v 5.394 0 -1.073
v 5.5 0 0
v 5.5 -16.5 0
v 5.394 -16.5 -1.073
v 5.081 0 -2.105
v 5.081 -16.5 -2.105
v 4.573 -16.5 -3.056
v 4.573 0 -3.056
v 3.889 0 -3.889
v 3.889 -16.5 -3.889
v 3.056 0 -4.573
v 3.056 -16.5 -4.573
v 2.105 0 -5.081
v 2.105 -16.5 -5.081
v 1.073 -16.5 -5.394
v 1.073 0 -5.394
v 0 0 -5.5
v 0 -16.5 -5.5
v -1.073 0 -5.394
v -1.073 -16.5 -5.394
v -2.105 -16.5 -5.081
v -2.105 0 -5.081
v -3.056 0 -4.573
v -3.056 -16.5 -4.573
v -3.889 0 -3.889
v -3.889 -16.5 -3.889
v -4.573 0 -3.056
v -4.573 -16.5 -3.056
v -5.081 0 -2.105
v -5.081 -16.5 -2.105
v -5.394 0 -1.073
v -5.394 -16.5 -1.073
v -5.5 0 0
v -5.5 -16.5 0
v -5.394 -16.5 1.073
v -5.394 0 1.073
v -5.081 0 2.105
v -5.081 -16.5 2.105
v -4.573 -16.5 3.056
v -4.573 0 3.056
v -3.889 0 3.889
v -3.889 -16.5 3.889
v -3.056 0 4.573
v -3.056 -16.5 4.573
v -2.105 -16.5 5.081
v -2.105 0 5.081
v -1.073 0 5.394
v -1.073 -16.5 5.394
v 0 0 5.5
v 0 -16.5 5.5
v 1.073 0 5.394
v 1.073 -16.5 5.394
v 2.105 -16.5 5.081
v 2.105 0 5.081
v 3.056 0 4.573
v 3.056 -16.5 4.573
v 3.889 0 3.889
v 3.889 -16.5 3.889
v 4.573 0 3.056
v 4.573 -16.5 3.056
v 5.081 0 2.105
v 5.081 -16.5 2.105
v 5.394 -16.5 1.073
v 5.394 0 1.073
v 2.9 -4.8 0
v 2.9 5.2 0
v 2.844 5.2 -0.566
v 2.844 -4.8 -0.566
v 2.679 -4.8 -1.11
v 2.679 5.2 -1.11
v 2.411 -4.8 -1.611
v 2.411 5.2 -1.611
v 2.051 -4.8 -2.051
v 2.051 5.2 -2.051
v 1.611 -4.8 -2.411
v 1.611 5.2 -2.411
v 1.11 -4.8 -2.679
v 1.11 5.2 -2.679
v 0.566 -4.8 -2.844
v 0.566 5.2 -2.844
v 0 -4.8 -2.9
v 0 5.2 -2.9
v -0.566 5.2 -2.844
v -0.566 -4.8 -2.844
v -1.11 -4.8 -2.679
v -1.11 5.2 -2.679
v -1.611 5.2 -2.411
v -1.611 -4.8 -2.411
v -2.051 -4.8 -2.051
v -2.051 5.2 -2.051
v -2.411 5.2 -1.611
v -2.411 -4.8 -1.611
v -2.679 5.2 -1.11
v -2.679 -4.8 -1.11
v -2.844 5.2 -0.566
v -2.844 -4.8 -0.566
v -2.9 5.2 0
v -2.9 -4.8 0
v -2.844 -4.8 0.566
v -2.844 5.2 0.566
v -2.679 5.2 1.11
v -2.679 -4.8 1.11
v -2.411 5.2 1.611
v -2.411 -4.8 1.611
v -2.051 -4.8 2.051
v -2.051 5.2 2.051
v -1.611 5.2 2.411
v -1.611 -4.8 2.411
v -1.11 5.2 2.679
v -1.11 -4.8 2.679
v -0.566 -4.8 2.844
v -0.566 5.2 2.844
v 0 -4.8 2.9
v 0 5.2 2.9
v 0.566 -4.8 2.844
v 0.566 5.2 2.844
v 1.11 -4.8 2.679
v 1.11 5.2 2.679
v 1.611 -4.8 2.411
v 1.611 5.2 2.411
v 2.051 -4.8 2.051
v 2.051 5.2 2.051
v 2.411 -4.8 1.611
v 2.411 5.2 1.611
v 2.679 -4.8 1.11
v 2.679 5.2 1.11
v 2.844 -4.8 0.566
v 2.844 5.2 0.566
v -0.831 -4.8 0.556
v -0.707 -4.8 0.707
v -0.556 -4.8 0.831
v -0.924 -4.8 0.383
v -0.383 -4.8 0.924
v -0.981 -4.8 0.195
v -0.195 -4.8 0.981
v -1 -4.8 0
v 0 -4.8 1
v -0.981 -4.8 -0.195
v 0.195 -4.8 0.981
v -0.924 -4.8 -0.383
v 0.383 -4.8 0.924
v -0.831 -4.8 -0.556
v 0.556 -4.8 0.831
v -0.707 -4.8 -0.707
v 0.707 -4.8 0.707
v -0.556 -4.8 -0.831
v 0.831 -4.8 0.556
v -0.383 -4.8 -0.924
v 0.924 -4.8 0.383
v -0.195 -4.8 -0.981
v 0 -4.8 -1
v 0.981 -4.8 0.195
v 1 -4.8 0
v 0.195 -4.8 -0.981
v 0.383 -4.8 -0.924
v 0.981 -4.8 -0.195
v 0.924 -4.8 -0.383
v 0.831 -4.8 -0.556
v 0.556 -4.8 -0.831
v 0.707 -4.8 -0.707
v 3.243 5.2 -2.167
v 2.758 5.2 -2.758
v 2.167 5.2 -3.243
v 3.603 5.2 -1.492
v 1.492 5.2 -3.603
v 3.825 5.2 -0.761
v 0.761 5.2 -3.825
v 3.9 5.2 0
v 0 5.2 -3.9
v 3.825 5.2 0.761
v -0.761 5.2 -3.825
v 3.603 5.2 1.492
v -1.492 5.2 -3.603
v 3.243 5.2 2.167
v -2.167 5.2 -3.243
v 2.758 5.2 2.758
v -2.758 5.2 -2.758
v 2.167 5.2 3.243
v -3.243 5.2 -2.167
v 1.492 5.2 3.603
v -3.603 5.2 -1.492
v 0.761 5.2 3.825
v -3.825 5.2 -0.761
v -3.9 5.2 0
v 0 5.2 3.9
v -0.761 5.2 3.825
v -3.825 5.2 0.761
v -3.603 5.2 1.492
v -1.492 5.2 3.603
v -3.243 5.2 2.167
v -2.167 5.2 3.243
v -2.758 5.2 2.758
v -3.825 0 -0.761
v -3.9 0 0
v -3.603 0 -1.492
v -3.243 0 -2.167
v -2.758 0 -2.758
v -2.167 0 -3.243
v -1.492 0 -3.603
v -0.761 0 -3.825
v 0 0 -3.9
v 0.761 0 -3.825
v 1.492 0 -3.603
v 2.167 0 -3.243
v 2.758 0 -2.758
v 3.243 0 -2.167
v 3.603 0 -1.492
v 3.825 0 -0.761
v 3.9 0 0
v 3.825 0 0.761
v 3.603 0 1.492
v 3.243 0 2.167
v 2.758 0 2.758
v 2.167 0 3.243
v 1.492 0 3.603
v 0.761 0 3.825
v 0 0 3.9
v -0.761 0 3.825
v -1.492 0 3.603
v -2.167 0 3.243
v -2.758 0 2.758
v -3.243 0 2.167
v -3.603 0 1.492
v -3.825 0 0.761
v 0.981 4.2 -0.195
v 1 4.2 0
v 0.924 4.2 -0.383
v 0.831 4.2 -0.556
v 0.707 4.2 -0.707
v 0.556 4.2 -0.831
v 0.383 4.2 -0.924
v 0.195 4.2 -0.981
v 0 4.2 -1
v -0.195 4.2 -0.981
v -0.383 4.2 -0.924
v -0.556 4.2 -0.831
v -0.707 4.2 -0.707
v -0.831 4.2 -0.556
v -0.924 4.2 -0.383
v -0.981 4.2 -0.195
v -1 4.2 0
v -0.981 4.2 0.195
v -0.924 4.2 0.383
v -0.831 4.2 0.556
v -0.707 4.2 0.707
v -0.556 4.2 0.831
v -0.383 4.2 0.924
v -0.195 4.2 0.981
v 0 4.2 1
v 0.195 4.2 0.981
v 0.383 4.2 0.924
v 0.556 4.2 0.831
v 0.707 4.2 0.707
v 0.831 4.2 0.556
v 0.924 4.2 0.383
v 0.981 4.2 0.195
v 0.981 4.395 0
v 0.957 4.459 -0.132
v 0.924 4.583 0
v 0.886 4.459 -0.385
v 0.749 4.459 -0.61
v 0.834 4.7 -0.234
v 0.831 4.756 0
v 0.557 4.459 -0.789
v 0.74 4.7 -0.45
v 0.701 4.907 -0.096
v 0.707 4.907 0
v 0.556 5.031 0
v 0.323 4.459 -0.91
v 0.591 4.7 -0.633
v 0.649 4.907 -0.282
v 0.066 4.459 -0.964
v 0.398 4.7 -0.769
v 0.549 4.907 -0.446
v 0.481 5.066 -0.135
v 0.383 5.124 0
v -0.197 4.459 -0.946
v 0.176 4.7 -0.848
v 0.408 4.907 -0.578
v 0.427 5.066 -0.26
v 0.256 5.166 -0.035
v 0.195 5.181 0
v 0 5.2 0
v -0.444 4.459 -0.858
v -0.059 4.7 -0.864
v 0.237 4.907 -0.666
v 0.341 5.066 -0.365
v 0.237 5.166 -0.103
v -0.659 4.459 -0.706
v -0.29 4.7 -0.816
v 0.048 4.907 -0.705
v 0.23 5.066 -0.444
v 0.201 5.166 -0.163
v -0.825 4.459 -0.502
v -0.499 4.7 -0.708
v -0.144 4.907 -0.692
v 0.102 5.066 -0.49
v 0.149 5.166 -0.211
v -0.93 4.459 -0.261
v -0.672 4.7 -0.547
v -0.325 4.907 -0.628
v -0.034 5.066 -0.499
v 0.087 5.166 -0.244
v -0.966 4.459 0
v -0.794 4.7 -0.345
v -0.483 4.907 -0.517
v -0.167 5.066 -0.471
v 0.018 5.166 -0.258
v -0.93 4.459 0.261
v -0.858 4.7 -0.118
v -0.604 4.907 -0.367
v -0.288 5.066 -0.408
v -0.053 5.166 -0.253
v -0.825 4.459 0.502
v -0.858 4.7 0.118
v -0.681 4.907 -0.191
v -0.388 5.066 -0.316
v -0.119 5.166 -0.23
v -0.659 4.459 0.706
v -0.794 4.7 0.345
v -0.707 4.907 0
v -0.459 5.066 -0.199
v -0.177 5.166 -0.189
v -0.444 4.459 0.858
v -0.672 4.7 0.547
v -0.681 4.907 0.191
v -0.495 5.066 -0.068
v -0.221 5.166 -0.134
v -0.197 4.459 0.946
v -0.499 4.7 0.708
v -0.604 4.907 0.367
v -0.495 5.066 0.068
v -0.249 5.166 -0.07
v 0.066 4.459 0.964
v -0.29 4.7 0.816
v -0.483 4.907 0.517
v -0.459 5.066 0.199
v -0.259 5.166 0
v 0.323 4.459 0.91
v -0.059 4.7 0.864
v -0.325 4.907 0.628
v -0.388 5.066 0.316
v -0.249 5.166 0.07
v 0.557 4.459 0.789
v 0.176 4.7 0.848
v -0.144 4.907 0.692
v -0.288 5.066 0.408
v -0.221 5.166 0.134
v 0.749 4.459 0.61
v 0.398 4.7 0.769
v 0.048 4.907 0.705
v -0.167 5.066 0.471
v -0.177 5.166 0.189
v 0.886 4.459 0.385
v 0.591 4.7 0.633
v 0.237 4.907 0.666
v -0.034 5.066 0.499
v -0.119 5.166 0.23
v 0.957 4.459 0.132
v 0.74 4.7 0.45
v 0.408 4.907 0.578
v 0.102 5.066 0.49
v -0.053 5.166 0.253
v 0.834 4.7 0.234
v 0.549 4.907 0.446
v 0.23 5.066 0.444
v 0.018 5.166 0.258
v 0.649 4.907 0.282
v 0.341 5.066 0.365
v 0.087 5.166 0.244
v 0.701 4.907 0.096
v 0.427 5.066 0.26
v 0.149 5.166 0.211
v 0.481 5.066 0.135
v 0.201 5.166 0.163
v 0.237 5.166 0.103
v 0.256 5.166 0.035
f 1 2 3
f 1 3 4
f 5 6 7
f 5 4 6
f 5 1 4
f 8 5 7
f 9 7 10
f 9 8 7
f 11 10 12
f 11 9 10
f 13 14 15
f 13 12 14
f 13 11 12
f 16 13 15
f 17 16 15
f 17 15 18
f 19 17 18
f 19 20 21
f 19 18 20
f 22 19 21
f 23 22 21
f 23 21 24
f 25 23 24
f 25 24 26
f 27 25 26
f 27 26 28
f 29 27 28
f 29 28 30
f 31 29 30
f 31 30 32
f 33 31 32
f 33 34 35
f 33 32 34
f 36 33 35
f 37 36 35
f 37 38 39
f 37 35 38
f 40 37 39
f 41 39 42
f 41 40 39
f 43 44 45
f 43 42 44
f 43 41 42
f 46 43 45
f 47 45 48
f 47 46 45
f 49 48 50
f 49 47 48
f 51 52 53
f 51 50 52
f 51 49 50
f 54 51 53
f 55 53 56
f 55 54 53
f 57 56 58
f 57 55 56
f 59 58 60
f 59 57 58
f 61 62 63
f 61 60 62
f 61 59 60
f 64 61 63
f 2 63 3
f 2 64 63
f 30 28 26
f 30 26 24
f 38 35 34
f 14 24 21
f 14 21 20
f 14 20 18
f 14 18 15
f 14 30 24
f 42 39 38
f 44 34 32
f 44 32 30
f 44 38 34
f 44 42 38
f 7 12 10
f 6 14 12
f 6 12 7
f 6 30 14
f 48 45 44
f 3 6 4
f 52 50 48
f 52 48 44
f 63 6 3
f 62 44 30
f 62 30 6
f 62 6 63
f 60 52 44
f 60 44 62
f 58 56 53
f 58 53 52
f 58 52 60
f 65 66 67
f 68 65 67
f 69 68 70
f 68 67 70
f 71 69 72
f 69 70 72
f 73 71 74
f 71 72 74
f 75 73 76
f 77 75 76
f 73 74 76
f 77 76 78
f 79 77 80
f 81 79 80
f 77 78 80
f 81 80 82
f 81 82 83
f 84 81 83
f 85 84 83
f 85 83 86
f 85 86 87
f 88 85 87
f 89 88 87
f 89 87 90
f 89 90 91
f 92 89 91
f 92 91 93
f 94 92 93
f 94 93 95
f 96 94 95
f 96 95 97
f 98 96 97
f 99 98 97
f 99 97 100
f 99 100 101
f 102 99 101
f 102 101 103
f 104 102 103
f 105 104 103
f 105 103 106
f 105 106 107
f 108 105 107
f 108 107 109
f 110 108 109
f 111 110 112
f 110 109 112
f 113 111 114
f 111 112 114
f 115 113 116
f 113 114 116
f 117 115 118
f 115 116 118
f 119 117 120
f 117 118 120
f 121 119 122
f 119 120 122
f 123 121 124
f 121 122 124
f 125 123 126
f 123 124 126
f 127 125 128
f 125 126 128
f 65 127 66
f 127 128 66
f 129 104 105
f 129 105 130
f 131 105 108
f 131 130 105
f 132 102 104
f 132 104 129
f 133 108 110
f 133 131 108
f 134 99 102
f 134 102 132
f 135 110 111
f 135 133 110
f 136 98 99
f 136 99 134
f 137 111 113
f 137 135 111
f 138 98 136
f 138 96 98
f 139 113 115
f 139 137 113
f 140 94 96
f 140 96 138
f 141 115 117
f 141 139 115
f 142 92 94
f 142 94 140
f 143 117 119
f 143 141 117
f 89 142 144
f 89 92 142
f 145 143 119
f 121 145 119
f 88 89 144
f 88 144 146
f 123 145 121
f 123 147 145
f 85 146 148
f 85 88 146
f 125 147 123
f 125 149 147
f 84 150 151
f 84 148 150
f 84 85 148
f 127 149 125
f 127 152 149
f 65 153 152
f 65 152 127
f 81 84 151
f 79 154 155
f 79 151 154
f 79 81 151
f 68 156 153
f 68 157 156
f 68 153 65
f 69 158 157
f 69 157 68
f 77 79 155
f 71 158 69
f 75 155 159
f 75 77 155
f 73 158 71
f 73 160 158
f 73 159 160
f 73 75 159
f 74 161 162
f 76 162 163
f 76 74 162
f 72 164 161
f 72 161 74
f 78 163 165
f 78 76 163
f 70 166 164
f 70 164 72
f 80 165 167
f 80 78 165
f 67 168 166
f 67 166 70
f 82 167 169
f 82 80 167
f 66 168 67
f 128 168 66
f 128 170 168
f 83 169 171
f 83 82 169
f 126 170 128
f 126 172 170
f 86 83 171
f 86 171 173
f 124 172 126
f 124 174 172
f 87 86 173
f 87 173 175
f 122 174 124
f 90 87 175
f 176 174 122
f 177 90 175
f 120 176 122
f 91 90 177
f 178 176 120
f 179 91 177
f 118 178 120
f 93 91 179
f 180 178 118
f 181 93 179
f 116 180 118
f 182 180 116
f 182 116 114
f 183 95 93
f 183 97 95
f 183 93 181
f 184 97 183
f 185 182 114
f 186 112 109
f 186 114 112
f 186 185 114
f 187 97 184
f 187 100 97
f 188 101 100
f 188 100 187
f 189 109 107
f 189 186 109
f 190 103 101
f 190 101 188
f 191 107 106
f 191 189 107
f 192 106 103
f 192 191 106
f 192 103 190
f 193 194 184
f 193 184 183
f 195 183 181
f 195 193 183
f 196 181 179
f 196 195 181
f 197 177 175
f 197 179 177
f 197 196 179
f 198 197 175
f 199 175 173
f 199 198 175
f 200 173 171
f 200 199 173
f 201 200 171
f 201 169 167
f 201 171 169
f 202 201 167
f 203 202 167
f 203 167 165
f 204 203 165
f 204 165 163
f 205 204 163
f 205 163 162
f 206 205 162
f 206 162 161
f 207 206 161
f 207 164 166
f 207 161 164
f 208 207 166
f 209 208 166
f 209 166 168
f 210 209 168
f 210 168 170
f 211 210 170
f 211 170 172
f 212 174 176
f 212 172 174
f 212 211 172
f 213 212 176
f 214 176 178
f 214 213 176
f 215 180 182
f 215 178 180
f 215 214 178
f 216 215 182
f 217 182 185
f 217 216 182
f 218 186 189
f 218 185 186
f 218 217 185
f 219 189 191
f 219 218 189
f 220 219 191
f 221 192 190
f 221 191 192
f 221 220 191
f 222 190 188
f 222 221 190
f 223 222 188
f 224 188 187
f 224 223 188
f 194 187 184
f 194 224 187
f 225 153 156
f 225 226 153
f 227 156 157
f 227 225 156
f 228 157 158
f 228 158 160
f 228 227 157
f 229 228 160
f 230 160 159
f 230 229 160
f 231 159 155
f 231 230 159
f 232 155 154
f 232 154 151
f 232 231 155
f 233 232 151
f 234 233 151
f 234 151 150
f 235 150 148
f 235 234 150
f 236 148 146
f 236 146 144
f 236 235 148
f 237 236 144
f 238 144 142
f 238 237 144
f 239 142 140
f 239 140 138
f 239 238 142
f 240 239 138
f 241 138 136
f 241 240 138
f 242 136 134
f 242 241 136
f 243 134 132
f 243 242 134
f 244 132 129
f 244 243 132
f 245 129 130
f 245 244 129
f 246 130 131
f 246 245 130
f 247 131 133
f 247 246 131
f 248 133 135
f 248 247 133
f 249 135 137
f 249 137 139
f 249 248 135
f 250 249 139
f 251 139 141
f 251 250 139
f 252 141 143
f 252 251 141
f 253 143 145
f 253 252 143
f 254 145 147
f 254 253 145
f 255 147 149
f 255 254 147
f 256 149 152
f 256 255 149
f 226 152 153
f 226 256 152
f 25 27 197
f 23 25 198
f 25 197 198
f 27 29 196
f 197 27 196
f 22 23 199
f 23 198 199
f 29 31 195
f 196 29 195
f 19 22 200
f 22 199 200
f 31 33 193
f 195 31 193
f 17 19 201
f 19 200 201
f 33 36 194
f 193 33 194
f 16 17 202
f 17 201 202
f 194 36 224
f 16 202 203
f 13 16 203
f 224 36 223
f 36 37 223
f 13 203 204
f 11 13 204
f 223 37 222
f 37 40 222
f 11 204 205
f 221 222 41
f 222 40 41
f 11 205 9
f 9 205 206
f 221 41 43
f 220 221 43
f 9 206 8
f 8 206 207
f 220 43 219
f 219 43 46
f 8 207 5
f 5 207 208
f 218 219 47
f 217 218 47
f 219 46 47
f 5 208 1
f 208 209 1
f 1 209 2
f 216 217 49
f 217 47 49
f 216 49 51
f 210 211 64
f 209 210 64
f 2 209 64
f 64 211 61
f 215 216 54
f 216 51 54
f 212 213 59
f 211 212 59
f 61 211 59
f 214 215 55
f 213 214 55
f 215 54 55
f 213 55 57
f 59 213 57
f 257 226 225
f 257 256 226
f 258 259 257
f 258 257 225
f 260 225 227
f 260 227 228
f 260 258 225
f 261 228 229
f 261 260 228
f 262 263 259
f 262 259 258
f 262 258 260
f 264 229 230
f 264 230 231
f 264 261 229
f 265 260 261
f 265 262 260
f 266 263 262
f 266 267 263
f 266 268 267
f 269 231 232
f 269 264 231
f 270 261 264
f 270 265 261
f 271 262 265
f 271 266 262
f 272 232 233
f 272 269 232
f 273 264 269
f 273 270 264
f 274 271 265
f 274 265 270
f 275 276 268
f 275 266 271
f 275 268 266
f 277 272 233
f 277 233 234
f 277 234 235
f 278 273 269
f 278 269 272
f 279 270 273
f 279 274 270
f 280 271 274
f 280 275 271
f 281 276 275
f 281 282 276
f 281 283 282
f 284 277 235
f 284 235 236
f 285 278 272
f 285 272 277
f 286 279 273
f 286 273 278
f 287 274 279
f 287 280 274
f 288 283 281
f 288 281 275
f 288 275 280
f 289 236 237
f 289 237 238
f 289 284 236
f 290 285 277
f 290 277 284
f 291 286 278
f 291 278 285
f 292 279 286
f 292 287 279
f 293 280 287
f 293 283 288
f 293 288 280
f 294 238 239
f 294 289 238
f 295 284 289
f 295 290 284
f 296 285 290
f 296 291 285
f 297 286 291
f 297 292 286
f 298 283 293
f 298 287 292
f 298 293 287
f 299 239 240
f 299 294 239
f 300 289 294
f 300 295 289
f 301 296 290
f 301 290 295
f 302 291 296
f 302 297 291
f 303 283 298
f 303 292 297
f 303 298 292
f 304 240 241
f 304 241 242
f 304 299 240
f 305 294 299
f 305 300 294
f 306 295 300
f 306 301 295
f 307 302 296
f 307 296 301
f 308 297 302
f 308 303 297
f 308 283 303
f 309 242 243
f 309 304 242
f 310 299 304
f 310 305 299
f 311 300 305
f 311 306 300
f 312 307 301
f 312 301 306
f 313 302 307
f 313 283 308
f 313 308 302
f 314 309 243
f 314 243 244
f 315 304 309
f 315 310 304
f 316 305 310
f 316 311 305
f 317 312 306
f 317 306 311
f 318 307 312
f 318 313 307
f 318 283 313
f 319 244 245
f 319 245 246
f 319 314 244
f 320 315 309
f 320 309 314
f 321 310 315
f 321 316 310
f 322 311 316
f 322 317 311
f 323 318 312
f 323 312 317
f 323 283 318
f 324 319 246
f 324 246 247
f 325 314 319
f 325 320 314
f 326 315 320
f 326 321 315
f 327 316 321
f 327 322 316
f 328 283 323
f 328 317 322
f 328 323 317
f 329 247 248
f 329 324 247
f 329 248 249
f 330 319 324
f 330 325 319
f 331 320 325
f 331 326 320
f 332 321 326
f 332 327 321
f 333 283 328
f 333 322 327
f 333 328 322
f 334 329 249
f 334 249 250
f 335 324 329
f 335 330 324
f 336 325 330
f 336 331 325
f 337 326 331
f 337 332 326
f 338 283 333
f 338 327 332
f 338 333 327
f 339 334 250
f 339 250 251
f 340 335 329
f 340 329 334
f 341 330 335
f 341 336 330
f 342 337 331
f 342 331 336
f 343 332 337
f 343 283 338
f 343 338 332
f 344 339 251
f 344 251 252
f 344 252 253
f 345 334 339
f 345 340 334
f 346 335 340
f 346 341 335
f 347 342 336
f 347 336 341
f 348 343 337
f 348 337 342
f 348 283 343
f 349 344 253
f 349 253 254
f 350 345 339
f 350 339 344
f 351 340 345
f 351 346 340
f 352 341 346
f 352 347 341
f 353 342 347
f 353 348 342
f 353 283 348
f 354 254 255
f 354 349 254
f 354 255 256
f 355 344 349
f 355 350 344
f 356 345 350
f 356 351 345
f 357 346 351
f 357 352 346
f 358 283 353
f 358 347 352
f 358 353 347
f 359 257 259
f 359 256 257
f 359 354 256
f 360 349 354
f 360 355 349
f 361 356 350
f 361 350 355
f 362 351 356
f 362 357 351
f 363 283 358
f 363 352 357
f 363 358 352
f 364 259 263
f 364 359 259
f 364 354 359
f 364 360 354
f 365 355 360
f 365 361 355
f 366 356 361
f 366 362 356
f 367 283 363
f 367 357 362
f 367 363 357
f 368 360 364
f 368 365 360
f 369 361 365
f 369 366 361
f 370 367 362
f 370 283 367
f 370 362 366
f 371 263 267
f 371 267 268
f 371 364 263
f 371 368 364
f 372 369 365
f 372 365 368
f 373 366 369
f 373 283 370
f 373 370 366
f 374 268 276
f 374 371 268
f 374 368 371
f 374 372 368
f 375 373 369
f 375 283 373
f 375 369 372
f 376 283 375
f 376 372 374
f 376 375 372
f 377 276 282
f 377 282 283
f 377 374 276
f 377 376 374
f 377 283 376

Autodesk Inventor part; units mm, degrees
ref_plane "YZ Plane" through (0, 0, 0) normal (1, 0, 0) x (0, 1, 0)
ref_plane "XZ Plane" through (0, 0, 0) normal (0, 1, 0) x (-1, 0, 0)
ref_plane "XY Plane" through (0, 0, 0) normal (0, 0, 1) x (1, 0, 0)
sketch "Sketch1" plane through (0, 0, 0) normal (0, 1, 0) x (-1, 0, 0)
  circle A0 centre (0, 0) radius 3.9
  dimension "d0" = 7.8
extrude "Extrusion1" add sketch "Sketch1" along normal blind 5.2
sketch "Sketch2" plane through (0, 0, 0) normal (0, -1, 0) x (1, 0, 0)
  circle A0 centre (0, 0) radius 5.5
  dimension "d3" = 11
extrude "Extrusion2" add sketch "Sketch2" along normal blind 16.5
sketch "Sketch3" plane through (0, 5.2, 0) normal (0, 1, 0) x (1, 0, 0)
  circle A0 centre (0, 0) radius 2.9
  circle A1 centre (0, 0) radius 1
  dimension "d6" = 5.8
  dimension "d7" = 2
extrude "Extrusion3" cut sketch "Sketch3" against normal blind 10
fillet "Fillet1" radius 1 1 edges at (-1, 5.2, 0)
properties part number "Strom"
